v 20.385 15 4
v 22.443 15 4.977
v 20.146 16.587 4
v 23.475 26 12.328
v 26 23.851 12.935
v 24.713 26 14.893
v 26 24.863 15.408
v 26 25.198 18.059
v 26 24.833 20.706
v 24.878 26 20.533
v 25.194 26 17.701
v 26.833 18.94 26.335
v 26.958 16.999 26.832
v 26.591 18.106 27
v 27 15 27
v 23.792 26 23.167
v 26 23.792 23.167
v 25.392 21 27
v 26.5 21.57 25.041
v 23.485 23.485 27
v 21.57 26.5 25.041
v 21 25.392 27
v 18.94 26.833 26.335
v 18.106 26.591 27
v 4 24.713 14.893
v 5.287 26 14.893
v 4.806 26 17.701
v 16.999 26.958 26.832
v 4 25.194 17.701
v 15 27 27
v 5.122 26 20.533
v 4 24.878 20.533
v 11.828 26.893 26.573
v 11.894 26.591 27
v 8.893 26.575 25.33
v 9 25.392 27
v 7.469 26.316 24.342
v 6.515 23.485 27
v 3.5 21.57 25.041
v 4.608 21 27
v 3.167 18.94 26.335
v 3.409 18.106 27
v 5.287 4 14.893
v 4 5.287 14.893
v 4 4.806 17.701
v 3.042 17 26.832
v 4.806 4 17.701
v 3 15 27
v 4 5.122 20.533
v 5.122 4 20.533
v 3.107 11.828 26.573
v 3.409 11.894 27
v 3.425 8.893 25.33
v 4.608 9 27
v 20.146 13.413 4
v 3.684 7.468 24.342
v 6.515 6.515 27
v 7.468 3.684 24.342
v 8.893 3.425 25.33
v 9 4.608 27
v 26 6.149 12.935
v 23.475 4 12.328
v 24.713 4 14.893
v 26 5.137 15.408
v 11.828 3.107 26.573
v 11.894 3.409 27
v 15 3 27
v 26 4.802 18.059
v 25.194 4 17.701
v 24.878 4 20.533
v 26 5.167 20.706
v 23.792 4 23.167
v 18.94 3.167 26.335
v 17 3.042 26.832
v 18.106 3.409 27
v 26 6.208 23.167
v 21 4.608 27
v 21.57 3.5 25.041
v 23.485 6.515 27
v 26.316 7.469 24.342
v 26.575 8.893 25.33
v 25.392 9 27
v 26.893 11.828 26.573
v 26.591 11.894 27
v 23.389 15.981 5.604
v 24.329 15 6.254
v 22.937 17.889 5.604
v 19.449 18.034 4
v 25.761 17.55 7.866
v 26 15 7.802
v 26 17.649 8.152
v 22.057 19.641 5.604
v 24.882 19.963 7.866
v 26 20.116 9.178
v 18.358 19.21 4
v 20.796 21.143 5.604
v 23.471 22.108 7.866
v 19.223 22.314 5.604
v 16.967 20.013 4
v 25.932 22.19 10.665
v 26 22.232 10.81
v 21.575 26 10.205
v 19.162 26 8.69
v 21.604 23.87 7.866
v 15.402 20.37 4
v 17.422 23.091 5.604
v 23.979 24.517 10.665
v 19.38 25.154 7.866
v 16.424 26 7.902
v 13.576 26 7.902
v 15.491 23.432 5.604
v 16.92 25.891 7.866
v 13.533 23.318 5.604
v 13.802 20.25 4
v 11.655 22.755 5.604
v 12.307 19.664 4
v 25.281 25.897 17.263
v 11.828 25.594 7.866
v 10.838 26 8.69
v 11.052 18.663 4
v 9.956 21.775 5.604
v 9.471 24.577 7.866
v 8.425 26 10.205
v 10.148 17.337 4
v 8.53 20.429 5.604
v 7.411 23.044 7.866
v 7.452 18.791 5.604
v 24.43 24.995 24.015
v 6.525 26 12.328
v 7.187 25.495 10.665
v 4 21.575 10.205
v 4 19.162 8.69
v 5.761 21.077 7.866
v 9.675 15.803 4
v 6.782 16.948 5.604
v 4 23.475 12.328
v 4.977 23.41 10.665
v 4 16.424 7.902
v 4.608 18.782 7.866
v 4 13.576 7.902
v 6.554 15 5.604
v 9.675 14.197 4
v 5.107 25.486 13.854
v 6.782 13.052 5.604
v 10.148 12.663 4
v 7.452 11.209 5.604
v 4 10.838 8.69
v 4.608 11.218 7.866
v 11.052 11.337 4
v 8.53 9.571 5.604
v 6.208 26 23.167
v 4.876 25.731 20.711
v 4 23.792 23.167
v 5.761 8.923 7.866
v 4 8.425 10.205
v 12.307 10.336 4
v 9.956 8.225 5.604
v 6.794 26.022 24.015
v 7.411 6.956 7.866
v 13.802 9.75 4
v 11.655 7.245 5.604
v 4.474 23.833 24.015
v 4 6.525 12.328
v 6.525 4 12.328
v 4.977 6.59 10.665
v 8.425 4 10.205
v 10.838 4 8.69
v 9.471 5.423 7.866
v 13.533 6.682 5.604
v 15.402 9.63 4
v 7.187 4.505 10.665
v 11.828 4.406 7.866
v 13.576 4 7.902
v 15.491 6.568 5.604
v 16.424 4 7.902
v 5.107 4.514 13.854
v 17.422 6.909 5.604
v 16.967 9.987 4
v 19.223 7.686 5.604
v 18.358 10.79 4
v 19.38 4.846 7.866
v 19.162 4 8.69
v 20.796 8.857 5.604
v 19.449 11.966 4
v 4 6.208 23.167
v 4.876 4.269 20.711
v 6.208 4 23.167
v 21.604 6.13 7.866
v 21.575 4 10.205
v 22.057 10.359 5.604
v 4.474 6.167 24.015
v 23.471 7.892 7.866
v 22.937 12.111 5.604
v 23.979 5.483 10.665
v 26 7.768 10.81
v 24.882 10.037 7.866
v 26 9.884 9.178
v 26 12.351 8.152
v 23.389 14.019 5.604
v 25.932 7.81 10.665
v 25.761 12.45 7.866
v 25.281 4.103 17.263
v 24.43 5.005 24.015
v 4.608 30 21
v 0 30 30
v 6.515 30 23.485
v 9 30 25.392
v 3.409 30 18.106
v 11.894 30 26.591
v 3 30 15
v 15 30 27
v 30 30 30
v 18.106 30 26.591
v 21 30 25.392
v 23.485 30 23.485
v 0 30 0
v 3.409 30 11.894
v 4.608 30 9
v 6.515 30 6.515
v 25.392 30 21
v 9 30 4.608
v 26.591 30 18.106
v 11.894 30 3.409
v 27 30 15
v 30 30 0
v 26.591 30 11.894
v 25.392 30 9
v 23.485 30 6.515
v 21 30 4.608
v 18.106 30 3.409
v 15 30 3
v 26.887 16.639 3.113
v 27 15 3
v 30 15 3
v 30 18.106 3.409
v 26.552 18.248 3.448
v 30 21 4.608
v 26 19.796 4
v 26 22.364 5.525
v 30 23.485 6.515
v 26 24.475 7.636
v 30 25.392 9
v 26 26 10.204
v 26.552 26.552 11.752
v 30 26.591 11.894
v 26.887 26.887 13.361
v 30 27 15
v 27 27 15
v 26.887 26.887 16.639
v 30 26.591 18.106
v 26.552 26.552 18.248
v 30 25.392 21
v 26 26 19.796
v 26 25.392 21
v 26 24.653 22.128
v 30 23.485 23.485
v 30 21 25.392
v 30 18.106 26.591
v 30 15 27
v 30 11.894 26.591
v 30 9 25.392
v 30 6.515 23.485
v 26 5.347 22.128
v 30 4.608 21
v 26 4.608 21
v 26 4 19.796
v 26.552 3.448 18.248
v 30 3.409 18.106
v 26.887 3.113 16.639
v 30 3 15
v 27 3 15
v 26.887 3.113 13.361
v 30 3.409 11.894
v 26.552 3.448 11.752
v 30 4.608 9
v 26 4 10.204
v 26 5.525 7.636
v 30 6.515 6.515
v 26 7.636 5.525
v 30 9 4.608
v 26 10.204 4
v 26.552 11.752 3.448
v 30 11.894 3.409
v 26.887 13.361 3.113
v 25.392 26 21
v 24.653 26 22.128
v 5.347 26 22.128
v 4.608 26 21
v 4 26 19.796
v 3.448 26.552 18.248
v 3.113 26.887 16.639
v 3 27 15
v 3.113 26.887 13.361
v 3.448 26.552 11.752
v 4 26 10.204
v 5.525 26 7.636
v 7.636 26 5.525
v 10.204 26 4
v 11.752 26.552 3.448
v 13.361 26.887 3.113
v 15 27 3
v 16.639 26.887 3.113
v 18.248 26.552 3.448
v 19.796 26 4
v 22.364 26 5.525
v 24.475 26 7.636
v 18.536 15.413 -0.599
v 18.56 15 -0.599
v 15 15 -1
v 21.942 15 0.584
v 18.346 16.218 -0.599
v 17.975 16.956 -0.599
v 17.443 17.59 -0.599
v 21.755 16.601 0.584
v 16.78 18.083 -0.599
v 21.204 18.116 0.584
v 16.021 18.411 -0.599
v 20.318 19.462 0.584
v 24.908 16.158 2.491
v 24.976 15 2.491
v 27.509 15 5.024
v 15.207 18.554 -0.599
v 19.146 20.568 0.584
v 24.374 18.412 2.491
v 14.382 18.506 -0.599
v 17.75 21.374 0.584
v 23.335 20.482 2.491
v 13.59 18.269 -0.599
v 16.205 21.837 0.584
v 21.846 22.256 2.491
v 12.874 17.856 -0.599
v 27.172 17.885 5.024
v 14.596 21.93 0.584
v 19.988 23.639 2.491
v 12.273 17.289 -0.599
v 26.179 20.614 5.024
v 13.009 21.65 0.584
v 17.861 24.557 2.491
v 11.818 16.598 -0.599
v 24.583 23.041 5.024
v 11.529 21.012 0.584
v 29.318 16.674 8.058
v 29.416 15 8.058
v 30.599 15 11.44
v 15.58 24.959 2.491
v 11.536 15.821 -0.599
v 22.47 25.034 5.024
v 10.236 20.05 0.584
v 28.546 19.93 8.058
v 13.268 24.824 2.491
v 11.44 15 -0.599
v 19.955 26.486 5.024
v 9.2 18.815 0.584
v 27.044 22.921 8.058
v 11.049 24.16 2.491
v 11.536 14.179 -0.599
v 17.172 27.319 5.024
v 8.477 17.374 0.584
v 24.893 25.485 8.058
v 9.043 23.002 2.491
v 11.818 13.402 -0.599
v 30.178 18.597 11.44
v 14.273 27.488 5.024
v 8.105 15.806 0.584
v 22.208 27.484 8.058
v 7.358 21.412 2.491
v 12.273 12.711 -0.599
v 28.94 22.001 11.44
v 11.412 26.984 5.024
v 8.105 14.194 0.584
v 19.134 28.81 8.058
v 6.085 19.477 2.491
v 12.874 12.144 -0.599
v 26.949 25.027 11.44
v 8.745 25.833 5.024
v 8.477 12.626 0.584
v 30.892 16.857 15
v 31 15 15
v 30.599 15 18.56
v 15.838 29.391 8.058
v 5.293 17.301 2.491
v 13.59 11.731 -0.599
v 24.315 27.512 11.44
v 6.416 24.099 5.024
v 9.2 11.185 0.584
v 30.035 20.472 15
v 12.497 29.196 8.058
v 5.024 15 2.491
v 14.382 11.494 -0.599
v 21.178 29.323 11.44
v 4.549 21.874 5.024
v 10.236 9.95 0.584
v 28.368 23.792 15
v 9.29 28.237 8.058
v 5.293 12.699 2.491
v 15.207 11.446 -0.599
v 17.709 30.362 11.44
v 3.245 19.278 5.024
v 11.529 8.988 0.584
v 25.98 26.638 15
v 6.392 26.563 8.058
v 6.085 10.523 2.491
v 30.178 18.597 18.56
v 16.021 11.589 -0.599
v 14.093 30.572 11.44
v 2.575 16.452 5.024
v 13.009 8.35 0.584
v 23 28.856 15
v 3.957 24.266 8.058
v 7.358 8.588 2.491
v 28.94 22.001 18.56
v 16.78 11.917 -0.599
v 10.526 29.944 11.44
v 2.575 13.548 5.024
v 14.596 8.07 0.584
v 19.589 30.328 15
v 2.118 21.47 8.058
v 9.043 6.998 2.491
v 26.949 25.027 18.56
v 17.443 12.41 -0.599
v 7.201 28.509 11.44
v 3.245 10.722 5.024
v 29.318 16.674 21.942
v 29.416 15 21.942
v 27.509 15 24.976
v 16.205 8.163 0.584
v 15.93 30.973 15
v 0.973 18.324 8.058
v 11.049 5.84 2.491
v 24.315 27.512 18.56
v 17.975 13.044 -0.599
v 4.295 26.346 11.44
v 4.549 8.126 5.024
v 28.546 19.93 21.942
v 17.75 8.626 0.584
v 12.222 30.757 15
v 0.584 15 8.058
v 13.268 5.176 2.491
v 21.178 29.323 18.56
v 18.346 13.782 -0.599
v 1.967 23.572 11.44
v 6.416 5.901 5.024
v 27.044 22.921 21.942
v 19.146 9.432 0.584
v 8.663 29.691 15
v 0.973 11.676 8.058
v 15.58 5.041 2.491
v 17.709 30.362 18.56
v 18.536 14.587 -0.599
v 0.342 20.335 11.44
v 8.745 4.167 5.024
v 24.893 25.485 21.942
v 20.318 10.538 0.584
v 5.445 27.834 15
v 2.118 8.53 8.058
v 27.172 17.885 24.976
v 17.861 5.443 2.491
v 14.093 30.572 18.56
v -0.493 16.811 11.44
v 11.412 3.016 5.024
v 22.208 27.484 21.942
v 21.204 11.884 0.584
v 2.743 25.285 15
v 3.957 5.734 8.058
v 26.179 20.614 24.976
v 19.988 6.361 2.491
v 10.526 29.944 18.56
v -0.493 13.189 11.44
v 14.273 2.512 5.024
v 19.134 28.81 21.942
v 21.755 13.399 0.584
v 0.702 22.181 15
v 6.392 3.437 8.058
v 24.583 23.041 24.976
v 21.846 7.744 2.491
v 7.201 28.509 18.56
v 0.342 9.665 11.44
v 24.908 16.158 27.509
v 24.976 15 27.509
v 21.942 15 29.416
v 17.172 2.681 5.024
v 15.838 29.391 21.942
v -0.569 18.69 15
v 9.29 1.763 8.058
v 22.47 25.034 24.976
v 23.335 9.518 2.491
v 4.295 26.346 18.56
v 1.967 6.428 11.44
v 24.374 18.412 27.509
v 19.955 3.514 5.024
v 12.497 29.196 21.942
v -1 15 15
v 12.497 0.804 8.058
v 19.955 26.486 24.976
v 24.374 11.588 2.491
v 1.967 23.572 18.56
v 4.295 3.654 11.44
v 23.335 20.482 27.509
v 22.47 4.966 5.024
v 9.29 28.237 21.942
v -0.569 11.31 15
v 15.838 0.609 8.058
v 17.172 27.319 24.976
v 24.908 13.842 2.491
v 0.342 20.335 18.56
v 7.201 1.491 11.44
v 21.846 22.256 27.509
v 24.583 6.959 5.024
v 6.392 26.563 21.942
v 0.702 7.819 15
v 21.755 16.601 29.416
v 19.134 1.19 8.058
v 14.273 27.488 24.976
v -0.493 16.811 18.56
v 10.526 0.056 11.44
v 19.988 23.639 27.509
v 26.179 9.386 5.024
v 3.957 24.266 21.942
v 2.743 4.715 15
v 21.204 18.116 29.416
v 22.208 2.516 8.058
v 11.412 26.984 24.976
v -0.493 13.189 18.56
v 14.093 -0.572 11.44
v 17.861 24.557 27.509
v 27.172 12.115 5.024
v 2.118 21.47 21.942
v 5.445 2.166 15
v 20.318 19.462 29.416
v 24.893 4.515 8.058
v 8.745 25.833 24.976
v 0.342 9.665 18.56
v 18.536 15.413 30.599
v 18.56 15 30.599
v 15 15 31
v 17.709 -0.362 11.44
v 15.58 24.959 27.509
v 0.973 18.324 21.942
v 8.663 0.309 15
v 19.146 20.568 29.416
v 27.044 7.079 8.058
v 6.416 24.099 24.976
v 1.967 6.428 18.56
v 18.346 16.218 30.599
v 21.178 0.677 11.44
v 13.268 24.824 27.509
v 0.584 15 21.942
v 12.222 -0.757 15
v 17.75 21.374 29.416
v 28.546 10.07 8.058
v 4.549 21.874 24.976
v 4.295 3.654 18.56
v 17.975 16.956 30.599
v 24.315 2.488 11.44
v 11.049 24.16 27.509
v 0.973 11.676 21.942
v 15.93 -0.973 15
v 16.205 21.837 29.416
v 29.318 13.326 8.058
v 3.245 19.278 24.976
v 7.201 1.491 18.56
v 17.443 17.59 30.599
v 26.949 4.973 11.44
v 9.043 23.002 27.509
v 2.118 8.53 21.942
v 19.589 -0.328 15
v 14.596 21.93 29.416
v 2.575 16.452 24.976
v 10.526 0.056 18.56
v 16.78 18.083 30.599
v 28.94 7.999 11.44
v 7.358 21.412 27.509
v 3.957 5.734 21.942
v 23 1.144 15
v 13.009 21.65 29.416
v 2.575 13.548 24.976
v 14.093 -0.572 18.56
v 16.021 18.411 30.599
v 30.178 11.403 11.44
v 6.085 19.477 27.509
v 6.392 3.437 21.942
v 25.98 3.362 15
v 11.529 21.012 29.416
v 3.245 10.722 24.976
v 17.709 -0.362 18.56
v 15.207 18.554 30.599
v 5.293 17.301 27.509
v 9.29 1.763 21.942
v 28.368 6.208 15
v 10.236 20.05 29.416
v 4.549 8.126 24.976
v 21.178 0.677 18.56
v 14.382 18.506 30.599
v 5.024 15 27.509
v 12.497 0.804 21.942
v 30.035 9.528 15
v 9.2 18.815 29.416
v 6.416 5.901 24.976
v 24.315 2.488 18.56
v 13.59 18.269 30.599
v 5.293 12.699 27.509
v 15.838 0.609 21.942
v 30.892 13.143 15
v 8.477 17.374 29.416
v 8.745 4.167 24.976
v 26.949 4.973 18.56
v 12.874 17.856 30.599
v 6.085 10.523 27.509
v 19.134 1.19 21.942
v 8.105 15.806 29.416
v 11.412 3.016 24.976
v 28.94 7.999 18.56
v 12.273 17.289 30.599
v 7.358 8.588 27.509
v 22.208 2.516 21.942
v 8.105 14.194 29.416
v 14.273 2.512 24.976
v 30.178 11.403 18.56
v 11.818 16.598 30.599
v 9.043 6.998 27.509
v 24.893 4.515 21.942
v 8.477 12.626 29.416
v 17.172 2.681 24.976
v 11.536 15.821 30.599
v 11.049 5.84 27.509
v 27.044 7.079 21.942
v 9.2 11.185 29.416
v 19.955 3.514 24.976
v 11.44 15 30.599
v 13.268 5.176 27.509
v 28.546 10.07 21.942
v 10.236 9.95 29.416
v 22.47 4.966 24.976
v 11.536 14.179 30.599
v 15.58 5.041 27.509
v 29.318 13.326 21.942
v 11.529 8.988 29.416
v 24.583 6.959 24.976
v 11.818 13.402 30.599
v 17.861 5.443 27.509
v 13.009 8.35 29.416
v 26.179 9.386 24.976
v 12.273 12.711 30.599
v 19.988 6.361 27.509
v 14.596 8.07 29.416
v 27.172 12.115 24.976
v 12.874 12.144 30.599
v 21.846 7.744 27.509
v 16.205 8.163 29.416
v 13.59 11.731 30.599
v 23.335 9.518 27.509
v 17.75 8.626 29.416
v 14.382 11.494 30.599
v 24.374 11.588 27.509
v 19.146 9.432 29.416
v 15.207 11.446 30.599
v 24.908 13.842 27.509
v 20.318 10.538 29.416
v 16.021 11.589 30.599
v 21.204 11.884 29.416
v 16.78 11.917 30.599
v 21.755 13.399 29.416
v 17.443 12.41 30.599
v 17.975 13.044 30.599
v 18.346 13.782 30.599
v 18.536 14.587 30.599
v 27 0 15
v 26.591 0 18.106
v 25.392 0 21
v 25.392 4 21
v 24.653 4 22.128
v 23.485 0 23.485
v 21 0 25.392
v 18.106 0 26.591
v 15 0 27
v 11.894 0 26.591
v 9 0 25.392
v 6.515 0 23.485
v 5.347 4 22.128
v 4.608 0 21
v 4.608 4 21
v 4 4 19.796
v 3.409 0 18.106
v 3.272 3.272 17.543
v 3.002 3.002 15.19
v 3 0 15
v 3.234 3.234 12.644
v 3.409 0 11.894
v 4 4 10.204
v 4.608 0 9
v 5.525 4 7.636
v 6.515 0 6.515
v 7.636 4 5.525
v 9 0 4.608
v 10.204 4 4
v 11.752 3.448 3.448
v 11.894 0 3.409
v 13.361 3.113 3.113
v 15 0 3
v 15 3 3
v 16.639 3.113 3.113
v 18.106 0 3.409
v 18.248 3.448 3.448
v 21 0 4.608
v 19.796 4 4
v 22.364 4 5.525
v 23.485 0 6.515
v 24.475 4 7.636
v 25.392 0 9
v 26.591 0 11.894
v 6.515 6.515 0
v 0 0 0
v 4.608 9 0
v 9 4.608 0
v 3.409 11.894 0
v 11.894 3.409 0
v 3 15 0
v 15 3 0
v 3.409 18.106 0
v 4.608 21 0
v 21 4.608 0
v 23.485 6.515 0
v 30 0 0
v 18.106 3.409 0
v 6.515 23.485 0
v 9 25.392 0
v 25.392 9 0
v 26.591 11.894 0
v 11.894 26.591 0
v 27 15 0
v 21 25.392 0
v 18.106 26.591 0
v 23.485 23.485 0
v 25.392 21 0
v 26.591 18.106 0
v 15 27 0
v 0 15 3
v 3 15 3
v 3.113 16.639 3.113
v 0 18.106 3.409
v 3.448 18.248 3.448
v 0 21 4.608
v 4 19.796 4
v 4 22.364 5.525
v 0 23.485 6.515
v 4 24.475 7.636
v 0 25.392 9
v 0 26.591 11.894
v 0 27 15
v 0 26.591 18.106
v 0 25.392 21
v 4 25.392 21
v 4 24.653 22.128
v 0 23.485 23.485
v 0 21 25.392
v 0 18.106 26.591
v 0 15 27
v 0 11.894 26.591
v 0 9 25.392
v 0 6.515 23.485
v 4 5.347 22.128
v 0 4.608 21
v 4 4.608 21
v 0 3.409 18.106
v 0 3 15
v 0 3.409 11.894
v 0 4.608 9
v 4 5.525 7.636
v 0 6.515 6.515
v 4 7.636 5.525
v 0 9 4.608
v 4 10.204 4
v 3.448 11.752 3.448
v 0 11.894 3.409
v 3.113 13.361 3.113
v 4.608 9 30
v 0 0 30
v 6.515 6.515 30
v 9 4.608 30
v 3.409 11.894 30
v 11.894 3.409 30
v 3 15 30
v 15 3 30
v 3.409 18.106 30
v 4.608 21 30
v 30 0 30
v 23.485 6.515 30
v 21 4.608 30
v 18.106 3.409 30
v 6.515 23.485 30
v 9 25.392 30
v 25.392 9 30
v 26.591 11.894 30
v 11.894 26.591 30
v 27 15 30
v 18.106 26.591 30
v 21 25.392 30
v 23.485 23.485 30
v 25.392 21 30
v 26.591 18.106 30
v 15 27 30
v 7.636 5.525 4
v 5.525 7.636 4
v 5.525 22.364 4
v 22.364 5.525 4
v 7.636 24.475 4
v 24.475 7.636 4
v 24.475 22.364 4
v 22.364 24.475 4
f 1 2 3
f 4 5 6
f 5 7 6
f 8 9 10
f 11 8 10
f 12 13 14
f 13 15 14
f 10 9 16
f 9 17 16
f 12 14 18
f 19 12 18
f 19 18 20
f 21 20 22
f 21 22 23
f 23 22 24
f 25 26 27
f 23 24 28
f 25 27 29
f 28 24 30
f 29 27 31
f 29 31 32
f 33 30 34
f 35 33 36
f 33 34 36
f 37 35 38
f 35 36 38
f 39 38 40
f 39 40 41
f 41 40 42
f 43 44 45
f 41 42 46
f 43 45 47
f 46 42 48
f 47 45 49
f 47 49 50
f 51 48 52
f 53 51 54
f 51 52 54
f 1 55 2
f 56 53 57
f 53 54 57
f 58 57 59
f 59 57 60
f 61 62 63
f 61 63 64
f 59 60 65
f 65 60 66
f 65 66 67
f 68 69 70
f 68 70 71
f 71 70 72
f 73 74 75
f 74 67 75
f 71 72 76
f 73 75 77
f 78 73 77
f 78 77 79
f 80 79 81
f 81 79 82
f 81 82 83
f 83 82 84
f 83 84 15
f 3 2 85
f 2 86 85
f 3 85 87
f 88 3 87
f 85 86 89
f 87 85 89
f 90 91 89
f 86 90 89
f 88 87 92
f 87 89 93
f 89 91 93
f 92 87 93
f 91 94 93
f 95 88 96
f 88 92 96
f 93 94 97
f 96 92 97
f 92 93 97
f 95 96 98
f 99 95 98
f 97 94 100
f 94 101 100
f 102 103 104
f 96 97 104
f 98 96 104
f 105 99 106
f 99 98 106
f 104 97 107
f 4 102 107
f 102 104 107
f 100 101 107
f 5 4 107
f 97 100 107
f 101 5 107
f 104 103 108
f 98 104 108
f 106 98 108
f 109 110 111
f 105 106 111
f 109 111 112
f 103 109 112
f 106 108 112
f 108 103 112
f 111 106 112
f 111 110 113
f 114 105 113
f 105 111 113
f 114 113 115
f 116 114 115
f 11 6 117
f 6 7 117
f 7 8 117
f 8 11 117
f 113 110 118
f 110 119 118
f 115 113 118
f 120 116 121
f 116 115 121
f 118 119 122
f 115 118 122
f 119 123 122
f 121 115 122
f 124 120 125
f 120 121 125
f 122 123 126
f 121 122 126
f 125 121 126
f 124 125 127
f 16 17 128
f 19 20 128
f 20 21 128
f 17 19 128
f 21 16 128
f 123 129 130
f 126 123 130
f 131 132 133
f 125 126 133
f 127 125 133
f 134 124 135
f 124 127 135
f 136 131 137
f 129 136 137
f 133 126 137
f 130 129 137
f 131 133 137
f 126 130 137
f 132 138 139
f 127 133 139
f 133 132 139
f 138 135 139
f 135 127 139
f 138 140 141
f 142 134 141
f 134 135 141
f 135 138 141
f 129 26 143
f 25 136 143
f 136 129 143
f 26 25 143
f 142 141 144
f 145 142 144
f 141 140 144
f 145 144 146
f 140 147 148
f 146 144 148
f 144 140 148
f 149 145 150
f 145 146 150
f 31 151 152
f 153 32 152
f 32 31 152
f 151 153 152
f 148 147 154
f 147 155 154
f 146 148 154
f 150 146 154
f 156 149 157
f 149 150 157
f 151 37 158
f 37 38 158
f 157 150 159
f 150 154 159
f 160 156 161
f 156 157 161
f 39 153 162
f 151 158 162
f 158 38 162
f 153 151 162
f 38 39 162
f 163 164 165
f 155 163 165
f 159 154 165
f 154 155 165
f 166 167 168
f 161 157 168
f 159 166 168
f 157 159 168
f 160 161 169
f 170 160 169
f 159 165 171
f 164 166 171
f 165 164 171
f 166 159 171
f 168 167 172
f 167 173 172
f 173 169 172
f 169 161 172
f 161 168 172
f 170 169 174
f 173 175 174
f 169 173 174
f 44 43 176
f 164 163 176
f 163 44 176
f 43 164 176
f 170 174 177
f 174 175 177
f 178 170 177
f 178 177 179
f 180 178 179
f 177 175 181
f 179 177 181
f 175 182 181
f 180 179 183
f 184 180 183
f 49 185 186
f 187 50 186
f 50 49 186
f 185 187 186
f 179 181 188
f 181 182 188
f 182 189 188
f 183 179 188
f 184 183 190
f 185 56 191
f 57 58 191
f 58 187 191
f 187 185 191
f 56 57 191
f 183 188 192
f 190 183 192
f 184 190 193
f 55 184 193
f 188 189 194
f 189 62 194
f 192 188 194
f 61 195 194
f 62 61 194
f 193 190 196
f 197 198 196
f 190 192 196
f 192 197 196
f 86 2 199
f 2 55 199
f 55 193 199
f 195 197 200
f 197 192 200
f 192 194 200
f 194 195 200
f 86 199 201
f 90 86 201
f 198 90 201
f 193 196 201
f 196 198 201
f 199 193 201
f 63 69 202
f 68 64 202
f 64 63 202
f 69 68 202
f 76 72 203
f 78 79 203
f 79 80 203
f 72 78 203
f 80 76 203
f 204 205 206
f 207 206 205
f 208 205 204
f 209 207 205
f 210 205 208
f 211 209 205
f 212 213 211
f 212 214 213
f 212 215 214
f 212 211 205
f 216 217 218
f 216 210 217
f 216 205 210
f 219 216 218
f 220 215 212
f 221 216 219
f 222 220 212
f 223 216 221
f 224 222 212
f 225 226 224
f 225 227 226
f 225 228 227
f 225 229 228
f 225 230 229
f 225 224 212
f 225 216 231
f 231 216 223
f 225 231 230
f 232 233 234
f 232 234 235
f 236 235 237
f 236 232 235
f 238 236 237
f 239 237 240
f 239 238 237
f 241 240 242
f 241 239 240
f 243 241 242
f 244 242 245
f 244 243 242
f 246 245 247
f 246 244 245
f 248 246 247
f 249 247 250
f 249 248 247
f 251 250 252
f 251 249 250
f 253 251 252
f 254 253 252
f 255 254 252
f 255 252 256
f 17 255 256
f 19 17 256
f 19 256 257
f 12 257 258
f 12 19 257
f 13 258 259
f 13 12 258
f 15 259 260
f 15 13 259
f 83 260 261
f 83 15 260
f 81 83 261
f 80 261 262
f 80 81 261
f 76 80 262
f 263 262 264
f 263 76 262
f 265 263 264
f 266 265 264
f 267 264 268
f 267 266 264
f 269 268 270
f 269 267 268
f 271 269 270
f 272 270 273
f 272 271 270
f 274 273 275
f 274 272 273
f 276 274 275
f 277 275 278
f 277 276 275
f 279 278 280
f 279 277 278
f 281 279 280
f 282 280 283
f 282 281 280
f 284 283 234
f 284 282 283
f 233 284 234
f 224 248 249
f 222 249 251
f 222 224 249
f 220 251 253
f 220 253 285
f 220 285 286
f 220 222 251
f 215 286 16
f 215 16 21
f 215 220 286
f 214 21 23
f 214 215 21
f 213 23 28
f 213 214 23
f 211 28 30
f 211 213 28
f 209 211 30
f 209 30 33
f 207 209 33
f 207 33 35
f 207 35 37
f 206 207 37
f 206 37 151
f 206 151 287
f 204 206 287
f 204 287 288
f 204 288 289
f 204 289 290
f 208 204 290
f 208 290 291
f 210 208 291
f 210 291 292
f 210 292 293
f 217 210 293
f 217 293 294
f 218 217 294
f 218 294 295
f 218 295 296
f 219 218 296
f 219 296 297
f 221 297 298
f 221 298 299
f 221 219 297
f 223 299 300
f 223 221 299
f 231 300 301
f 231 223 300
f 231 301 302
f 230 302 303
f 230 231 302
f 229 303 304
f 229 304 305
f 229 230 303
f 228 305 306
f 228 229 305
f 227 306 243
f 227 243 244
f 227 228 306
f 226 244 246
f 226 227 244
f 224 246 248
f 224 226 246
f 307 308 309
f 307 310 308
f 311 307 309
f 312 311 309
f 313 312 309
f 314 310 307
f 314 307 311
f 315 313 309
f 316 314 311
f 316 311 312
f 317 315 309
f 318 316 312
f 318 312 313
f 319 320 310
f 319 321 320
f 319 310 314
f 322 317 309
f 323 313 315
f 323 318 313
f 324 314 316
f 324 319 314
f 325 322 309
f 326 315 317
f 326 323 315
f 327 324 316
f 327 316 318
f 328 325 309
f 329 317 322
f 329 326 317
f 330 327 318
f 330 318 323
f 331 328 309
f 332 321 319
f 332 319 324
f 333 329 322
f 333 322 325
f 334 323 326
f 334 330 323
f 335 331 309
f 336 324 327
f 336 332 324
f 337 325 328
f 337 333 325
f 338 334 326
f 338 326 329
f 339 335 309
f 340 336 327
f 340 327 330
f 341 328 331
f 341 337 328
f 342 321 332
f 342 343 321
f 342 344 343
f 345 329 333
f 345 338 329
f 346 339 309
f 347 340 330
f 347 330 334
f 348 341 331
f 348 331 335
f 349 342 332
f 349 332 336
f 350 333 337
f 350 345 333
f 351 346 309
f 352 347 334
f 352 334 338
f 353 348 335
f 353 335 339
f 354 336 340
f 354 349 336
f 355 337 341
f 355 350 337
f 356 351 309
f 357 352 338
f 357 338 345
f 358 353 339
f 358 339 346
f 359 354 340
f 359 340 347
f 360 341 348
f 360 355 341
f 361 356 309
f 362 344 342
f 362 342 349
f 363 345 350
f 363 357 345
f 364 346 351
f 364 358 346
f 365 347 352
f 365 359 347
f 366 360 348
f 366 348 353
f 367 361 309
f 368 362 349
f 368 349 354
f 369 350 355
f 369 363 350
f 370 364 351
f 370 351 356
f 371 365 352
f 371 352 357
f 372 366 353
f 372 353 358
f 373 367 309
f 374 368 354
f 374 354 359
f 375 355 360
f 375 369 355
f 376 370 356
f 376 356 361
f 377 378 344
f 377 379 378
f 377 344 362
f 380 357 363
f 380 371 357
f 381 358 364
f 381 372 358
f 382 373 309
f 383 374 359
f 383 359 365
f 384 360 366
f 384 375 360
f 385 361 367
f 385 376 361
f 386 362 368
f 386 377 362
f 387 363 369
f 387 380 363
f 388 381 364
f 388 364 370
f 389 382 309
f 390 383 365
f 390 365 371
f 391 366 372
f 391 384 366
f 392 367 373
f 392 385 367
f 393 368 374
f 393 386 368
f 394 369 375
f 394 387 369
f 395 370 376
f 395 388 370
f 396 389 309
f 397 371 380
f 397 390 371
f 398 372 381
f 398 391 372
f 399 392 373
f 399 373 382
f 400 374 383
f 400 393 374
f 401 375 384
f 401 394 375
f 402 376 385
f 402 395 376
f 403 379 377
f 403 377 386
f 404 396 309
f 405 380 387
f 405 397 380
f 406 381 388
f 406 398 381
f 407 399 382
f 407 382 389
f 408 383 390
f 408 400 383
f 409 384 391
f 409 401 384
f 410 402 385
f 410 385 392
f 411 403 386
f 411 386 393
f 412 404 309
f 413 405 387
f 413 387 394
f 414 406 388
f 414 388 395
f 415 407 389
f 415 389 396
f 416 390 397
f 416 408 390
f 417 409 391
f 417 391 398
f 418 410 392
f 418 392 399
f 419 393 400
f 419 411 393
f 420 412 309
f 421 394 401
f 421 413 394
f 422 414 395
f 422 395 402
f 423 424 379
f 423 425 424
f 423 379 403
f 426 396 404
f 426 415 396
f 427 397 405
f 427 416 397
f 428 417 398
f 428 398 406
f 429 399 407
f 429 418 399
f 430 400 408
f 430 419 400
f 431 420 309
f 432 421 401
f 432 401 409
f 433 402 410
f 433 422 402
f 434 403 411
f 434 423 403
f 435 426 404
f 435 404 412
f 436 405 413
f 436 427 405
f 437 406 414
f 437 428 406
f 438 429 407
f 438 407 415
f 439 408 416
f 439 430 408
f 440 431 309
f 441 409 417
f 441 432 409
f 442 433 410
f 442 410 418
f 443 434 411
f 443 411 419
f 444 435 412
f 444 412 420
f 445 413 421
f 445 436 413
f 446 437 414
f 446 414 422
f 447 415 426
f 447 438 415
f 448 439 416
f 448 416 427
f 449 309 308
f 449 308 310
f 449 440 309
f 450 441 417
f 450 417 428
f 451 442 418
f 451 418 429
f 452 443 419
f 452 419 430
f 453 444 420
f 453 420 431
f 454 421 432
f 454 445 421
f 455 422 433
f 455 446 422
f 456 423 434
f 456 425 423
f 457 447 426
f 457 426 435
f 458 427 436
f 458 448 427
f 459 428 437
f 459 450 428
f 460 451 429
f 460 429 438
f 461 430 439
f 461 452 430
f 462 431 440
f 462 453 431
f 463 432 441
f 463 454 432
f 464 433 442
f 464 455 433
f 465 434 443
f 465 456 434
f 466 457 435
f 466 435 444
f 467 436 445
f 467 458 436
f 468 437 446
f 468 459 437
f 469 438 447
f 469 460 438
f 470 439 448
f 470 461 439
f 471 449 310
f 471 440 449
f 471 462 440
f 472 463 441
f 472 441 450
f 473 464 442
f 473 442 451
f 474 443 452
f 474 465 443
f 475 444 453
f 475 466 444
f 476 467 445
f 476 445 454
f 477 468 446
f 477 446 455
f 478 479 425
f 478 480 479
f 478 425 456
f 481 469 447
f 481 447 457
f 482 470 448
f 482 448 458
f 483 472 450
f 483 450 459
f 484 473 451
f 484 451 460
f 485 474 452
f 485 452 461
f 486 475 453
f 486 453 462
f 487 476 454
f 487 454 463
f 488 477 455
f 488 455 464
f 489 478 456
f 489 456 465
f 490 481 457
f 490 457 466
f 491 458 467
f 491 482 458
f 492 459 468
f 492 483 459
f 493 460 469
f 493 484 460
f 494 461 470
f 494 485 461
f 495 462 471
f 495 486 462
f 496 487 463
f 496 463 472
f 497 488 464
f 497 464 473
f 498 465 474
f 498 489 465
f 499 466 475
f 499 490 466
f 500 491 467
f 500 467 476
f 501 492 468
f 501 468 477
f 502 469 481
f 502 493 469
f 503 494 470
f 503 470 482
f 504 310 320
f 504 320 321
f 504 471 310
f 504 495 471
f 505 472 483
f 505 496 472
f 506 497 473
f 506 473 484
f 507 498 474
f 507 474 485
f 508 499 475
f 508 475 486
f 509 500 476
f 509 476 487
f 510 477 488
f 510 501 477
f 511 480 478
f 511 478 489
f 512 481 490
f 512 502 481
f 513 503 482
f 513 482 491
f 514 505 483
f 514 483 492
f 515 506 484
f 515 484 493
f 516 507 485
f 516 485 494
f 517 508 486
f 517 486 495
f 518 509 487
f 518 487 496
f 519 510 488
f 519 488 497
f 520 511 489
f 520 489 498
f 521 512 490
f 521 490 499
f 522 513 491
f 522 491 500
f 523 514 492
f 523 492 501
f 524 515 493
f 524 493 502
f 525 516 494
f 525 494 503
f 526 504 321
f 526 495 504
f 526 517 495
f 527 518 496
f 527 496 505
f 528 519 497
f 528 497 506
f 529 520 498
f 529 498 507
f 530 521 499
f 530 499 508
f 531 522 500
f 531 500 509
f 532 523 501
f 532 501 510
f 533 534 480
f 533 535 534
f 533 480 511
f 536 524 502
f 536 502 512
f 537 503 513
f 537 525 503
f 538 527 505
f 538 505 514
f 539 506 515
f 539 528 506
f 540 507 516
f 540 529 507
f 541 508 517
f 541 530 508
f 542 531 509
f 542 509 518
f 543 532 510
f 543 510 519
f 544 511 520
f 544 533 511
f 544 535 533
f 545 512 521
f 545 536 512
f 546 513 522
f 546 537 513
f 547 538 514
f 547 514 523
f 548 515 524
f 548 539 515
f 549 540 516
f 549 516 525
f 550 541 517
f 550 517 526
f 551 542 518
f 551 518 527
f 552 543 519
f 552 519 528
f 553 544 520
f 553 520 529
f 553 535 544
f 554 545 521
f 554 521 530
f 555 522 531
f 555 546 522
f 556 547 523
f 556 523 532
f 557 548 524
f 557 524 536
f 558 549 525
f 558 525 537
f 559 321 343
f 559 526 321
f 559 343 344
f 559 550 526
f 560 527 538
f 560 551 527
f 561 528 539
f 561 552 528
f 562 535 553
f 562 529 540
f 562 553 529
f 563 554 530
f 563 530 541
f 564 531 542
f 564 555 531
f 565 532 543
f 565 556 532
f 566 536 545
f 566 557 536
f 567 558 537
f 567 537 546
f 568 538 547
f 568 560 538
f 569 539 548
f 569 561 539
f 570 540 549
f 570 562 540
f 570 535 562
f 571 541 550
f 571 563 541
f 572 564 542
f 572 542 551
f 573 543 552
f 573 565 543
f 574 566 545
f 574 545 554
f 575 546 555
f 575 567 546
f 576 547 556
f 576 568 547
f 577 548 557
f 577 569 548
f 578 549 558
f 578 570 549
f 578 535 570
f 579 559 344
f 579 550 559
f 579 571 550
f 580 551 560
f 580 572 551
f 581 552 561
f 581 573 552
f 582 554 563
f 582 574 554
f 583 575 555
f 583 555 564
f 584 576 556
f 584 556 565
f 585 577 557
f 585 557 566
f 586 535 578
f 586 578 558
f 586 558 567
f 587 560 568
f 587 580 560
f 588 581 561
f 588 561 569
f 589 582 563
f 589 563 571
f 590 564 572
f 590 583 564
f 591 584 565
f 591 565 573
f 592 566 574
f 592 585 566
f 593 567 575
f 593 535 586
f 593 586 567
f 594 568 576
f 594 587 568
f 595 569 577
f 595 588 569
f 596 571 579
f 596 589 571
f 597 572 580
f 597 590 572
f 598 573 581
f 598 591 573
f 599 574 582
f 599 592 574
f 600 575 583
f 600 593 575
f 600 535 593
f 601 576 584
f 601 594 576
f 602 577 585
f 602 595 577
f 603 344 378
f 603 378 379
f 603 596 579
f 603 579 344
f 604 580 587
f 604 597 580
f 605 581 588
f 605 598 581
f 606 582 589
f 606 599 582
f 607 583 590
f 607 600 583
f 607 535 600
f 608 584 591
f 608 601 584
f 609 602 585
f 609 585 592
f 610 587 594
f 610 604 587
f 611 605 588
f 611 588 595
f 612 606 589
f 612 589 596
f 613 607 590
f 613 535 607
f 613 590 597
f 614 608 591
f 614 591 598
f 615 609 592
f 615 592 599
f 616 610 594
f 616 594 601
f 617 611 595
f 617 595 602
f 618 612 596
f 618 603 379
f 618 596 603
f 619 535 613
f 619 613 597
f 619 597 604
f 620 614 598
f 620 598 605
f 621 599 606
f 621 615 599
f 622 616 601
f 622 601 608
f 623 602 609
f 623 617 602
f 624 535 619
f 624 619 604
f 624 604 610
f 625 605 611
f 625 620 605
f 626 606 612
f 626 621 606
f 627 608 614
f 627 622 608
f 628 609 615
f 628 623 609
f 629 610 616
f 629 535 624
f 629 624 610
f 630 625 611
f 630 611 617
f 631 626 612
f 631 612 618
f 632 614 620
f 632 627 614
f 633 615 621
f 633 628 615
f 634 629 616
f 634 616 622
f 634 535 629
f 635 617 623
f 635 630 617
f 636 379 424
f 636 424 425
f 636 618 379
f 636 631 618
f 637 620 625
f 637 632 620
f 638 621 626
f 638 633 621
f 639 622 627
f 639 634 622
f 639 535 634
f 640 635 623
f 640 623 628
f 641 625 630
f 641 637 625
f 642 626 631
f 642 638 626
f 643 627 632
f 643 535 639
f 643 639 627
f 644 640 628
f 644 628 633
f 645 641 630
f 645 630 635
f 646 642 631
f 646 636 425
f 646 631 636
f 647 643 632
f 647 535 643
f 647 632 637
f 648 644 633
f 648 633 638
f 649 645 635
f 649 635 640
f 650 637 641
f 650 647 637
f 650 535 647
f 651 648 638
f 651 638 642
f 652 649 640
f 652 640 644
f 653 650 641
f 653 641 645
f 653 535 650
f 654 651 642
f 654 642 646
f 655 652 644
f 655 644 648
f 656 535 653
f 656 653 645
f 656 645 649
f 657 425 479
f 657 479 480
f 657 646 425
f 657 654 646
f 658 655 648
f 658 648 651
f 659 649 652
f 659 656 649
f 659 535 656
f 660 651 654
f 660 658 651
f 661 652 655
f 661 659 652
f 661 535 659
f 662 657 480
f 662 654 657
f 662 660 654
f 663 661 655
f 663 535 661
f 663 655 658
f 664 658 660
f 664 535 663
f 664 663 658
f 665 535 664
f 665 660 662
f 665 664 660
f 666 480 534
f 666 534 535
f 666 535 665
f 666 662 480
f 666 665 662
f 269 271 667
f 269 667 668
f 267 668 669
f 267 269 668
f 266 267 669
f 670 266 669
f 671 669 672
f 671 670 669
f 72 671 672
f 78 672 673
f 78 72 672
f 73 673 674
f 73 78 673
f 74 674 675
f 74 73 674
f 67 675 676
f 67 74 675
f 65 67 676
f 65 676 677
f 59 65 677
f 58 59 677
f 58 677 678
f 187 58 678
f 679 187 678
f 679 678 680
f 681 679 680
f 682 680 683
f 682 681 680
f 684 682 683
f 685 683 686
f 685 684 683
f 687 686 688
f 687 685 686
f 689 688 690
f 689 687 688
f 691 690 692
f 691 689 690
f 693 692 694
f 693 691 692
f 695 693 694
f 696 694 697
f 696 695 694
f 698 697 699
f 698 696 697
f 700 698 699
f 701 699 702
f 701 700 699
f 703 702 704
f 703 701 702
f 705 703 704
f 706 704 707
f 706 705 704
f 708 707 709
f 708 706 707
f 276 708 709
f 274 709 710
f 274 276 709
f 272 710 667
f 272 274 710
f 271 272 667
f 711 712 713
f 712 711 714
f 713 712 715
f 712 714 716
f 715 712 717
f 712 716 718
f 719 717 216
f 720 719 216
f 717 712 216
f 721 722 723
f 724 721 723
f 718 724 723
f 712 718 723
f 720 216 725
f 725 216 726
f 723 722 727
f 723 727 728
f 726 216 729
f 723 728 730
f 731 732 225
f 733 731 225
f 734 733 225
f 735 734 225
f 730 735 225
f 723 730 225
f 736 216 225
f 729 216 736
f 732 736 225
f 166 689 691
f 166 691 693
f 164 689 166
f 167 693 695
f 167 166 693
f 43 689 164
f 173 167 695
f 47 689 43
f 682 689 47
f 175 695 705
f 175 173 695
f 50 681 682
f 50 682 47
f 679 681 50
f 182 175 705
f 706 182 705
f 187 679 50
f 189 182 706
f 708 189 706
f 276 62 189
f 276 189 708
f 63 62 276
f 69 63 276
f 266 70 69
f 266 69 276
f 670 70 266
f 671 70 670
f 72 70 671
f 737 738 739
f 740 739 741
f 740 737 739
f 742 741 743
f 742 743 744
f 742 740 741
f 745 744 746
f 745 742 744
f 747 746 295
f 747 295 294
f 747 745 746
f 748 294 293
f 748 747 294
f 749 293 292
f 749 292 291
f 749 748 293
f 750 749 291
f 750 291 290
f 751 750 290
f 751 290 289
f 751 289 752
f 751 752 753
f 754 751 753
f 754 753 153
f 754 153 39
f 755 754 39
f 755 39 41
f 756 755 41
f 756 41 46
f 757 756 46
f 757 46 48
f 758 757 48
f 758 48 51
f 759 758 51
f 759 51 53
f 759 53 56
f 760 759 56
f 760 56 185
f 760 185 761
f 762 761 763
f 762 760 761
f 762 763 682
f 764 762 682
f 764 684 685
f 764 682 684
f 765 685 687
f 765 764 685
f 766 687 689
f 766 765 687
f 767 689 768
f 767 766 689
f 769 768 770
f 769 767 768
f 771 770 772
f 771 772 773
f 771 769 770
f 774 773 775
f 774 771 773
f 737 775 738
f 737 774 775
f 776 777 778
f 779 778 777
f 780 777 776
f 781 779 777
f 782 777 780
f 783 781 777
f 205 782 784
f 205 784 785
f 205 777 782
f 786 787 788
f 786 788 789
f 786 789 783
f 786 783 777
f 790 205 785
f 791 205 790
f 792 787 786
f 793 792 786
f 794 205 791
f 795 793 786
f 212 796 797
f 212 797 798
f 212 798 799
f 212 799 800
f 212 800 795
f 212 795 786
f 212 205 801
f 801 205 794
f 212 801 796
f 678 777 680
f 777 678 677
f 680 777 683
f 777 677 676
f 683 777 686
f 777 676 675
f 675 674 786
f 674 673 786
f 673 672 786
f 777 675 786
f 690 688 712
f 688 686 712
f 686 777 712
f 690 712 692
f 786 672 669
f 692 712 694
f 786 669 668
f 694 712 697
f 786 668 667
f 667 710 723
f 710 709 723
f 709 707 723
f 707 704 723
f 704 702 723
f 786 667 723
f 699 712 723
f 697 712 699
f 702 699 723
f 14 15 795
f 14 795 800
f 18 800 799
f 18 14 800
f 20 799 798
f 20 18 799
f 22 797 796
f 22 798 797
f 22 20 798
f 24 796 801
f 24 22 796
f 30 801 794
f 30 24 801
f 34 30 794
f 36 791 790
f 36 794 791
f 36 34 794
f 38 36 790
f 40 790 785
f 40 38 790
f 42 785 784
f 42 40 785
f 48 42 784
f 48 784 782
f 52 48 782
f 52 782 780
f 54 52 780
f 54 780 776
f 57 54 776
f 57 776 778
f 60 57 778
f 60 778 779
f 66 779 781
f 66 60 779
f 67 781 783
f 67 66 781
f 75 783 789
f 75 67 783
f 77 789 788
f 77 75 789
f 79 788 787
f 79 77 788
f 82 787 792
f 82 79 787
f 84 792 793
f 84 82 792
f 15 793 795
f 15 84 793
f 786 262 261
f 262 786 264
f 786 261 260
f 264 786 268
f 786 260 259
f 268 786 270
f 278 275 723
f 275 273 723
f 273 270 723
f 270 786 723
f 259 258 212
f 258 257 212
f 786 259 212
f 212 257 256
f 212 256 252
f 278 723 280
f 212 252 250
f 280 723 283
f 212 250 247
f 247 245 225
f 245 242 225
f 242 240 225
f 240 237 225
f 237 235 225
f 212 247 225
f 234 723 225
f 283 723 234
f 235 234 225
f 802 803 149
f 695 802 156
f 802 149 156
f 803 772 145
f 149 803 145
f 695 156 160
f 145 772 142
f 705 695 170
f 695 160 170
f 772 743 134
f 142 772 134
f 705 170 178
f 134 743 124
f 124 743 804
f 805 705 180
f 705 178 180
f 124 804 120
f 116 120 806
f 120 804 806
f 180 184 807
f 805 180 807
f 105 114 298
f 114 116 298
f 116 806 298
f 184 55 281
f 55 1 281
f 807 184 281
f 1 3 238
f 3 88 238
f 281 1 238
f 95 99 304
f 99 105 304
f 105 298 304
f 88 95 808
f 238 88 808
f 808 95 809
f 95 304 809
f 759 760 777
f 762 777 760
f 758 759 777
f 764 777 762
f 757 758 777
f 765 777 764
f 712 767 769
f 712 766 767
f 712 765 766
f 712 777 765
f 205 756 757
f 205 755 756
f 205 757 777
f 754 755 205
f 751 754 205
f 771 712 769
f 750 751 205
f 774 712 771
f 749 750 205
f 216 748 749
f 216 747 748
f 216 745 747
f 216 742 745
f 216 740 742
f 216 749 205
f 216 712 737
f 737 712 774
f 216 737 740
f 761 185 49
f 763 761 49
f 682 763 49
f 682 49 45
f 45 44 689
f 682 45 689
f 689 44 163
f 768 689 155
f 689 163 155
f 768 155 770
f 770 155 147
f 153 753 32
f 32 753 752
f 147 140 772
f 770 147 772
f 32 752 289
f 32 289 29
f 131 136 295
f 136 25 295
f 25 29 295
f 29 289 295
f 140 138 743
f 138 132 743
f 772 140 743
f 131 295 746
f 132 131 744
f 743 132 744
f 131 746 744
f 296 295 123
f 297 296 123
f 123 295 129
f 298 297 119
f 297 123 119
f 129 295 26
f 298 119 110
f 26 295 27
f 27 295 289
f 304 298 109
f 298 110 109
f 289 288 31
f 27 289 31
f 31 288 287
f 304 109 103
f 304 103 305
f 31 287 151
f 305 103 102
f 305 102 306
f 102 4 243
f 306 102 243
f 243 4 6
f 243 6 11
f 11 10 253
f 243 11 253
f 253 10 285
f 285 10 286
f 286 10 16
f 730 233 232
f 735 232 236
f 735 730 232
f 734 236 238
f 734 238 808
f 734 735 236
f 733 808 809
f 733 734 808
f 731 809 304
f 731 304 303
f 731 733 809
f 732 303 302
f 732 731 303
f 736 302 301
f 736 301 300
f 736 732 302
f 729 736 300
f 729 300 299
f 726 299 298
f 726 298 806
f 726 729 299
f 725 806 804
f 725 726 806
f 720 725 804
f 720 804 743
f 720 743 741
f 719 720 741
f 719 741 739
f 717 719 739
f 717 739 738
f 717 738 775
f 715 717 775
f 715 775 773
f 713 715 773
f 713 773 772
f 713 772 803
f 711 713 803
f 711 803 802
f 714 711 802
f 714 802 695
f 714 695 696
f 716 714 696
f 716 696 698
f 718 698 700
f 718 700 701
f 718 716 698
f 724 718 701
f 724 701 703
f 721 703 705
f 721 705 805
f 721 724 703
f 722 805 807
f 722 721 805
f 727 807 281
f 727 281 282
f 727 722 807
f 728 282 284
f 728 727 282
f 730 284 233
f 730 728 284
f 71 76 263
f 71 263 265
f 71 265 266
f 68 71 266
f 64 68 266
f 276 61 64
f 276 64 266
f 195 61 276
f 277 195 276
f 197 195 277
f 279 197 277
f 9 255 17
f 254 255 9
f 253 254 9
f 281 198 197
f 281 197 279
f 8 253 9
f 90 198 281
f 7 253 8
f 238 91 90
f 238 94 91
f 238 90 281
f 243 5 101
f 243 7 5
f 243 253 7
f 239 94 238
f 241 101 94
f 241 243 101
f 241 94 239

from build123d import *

# Parameters (mm, degrees)
CYLINDER001_R     = 12
CYLINDER001_DEPTH = 5
CYLINDER002_R     = 12
CYLINDER002_DEPTH = 5
CYLINDER003_R     = 12
CYLINDER003_DEPTH = 5
CYLINDER004_R     = 12
CYLINDER004_DEPTH = 5
CYLINDER005_R     = 12
CYLINDER005_DEPTH = 5
CYLINDER_R        = 12
CYLINDER_DEPTH    = 5
BOX_W             = 30
BOX_H             = 30
BOX_DEPTH         = 30


with BuildPart() as cylinder001:
    # Cylinder001 → Cylinder001 (new body)
    with BuildSketch(Plane(origin=(26, 15, 15), x_dir=(0, 0, -1), z_dir=(1, 0, 0))):
        Circle(CYLINDER001_R)
    extrude(amount=CYLINDER001_DEPTH)


with BuildPart() as cylinder002:
    # Cylinder002 → Cylinder002 (new body)
    with BuildSketch(Plane(origin=(-1, 15, 15), x_dir=(0, 0, -1), z_dir=(1, 0, 0))):
        Circle(CYLINDER002_R)
    extrude(amount=CYLINDER002_DEPTH)


with BuildPart() as cilindre:
    # Cylinder003 → Cylinder003 (new body)
    with BuildSketch(Plane(origin=(15, 4, 15), x_dir=(1, 0, 0), z_dir=(0, -1, 0))):
        Circle(CYLINDER003_R)
    extrude(amount=CYLINDER003_DEPTH)


with BuildPart() as cilindre001:
    # Cylinder004 → Cylinder004 (new body)
    with BuildSketch(Plane(origin=(15, 31, 15), x_dir=(1, 0, 0), z_dir=(0, -1, 0))):
        Circle(CYLINDER004_R)
    extrude(amount=CYLINDER004_DEPTH)


with BuildPart() as tall002:
    # Cylinder005 → Cylinder005 (new body)
    with BuildSketch(Plane(origin=(15, 15, -1), x_dir=(1, 0, 0), z_dir=(0, 0, 1))):
        Circle(CYLINDER005_R)
    extrude(amount=CYLINDER005_DEPTH)


with BuildPart() as tall1:
    # Cylinder → Cylinder (new body)
    with BuildSketch(Plane(origin=(15, 15, 26), x_dir=(1, 0, 0), z_dir=(0, 0, 1))):
        Circle(CYLINDER_R)
    extrude(amount=CYLINDER_DEPTH)


with BuildPart() as esfera_tall:
    # Sphere → Sphere (revolve)
    with BuildSketch(Plane(origin=(15, 15, 18), x_dir=(1, 0, 0), z_dir=(0, -1, 0))):
        with BuildLine():
            ThreePointArc((0, -15), (15, 0), (0, 15))
            Line((0, 15), (0, -15))
        make_face()
    revolve(axis=Axis((15, 15, 18), (0, 0, 1)))


with BuildPart() as cut006:
    # Box → Box (new body)
    with BuildSketch(Plane.XY):
        with Locations((15, 15)):
            Rectangle(BOX_W, BOX_H)
    extrude(amount=BOX_DEPTH)

    # Cut: cut Esfera tall
    add(esfera_tall.part, mode=Mode.SUBTRACT)

    # Cut001: cut Tall1
    add(tall1.part, mode=Mode.SUBTRACT)

    # Cut002: cut Tall002
    add(tall002.part, mode=Mode.SUBTRACT)

    # Cut003: cut Cilindre001
    add(cilindre001.part, mode=Mode.SUBTRACT)

    # Cut004: cut Cilindre
    add(cilindre.part, mode=Mode.SUBTRACT)

    # Cut005: cut Cylinder002
    add(cylinder002.part, mode=Mode.SUBTRACT)

    # Cut006: cut Cylinder001
    add(cylinder001.part, mode=Mode.SUBTRACT)


with BuildPart() as esfera:
    # Sphere001 → Sphere001 (revolve)
    with BuildSketch(Plane(origin=(15, 15, 15), x_dir=(1, 0, 0), z_dir=(0, -1, 0))):
        with BuildLine():
            ThreePointArc((0, -16), (16, 0), (0, 16))
            Line((0, 16), (0, -16))
        make_face()
    revolve(axis=Axis((15, 15, 15), (0, 0, 1)))


solid = Compound([cut006.part, esfera.part])
